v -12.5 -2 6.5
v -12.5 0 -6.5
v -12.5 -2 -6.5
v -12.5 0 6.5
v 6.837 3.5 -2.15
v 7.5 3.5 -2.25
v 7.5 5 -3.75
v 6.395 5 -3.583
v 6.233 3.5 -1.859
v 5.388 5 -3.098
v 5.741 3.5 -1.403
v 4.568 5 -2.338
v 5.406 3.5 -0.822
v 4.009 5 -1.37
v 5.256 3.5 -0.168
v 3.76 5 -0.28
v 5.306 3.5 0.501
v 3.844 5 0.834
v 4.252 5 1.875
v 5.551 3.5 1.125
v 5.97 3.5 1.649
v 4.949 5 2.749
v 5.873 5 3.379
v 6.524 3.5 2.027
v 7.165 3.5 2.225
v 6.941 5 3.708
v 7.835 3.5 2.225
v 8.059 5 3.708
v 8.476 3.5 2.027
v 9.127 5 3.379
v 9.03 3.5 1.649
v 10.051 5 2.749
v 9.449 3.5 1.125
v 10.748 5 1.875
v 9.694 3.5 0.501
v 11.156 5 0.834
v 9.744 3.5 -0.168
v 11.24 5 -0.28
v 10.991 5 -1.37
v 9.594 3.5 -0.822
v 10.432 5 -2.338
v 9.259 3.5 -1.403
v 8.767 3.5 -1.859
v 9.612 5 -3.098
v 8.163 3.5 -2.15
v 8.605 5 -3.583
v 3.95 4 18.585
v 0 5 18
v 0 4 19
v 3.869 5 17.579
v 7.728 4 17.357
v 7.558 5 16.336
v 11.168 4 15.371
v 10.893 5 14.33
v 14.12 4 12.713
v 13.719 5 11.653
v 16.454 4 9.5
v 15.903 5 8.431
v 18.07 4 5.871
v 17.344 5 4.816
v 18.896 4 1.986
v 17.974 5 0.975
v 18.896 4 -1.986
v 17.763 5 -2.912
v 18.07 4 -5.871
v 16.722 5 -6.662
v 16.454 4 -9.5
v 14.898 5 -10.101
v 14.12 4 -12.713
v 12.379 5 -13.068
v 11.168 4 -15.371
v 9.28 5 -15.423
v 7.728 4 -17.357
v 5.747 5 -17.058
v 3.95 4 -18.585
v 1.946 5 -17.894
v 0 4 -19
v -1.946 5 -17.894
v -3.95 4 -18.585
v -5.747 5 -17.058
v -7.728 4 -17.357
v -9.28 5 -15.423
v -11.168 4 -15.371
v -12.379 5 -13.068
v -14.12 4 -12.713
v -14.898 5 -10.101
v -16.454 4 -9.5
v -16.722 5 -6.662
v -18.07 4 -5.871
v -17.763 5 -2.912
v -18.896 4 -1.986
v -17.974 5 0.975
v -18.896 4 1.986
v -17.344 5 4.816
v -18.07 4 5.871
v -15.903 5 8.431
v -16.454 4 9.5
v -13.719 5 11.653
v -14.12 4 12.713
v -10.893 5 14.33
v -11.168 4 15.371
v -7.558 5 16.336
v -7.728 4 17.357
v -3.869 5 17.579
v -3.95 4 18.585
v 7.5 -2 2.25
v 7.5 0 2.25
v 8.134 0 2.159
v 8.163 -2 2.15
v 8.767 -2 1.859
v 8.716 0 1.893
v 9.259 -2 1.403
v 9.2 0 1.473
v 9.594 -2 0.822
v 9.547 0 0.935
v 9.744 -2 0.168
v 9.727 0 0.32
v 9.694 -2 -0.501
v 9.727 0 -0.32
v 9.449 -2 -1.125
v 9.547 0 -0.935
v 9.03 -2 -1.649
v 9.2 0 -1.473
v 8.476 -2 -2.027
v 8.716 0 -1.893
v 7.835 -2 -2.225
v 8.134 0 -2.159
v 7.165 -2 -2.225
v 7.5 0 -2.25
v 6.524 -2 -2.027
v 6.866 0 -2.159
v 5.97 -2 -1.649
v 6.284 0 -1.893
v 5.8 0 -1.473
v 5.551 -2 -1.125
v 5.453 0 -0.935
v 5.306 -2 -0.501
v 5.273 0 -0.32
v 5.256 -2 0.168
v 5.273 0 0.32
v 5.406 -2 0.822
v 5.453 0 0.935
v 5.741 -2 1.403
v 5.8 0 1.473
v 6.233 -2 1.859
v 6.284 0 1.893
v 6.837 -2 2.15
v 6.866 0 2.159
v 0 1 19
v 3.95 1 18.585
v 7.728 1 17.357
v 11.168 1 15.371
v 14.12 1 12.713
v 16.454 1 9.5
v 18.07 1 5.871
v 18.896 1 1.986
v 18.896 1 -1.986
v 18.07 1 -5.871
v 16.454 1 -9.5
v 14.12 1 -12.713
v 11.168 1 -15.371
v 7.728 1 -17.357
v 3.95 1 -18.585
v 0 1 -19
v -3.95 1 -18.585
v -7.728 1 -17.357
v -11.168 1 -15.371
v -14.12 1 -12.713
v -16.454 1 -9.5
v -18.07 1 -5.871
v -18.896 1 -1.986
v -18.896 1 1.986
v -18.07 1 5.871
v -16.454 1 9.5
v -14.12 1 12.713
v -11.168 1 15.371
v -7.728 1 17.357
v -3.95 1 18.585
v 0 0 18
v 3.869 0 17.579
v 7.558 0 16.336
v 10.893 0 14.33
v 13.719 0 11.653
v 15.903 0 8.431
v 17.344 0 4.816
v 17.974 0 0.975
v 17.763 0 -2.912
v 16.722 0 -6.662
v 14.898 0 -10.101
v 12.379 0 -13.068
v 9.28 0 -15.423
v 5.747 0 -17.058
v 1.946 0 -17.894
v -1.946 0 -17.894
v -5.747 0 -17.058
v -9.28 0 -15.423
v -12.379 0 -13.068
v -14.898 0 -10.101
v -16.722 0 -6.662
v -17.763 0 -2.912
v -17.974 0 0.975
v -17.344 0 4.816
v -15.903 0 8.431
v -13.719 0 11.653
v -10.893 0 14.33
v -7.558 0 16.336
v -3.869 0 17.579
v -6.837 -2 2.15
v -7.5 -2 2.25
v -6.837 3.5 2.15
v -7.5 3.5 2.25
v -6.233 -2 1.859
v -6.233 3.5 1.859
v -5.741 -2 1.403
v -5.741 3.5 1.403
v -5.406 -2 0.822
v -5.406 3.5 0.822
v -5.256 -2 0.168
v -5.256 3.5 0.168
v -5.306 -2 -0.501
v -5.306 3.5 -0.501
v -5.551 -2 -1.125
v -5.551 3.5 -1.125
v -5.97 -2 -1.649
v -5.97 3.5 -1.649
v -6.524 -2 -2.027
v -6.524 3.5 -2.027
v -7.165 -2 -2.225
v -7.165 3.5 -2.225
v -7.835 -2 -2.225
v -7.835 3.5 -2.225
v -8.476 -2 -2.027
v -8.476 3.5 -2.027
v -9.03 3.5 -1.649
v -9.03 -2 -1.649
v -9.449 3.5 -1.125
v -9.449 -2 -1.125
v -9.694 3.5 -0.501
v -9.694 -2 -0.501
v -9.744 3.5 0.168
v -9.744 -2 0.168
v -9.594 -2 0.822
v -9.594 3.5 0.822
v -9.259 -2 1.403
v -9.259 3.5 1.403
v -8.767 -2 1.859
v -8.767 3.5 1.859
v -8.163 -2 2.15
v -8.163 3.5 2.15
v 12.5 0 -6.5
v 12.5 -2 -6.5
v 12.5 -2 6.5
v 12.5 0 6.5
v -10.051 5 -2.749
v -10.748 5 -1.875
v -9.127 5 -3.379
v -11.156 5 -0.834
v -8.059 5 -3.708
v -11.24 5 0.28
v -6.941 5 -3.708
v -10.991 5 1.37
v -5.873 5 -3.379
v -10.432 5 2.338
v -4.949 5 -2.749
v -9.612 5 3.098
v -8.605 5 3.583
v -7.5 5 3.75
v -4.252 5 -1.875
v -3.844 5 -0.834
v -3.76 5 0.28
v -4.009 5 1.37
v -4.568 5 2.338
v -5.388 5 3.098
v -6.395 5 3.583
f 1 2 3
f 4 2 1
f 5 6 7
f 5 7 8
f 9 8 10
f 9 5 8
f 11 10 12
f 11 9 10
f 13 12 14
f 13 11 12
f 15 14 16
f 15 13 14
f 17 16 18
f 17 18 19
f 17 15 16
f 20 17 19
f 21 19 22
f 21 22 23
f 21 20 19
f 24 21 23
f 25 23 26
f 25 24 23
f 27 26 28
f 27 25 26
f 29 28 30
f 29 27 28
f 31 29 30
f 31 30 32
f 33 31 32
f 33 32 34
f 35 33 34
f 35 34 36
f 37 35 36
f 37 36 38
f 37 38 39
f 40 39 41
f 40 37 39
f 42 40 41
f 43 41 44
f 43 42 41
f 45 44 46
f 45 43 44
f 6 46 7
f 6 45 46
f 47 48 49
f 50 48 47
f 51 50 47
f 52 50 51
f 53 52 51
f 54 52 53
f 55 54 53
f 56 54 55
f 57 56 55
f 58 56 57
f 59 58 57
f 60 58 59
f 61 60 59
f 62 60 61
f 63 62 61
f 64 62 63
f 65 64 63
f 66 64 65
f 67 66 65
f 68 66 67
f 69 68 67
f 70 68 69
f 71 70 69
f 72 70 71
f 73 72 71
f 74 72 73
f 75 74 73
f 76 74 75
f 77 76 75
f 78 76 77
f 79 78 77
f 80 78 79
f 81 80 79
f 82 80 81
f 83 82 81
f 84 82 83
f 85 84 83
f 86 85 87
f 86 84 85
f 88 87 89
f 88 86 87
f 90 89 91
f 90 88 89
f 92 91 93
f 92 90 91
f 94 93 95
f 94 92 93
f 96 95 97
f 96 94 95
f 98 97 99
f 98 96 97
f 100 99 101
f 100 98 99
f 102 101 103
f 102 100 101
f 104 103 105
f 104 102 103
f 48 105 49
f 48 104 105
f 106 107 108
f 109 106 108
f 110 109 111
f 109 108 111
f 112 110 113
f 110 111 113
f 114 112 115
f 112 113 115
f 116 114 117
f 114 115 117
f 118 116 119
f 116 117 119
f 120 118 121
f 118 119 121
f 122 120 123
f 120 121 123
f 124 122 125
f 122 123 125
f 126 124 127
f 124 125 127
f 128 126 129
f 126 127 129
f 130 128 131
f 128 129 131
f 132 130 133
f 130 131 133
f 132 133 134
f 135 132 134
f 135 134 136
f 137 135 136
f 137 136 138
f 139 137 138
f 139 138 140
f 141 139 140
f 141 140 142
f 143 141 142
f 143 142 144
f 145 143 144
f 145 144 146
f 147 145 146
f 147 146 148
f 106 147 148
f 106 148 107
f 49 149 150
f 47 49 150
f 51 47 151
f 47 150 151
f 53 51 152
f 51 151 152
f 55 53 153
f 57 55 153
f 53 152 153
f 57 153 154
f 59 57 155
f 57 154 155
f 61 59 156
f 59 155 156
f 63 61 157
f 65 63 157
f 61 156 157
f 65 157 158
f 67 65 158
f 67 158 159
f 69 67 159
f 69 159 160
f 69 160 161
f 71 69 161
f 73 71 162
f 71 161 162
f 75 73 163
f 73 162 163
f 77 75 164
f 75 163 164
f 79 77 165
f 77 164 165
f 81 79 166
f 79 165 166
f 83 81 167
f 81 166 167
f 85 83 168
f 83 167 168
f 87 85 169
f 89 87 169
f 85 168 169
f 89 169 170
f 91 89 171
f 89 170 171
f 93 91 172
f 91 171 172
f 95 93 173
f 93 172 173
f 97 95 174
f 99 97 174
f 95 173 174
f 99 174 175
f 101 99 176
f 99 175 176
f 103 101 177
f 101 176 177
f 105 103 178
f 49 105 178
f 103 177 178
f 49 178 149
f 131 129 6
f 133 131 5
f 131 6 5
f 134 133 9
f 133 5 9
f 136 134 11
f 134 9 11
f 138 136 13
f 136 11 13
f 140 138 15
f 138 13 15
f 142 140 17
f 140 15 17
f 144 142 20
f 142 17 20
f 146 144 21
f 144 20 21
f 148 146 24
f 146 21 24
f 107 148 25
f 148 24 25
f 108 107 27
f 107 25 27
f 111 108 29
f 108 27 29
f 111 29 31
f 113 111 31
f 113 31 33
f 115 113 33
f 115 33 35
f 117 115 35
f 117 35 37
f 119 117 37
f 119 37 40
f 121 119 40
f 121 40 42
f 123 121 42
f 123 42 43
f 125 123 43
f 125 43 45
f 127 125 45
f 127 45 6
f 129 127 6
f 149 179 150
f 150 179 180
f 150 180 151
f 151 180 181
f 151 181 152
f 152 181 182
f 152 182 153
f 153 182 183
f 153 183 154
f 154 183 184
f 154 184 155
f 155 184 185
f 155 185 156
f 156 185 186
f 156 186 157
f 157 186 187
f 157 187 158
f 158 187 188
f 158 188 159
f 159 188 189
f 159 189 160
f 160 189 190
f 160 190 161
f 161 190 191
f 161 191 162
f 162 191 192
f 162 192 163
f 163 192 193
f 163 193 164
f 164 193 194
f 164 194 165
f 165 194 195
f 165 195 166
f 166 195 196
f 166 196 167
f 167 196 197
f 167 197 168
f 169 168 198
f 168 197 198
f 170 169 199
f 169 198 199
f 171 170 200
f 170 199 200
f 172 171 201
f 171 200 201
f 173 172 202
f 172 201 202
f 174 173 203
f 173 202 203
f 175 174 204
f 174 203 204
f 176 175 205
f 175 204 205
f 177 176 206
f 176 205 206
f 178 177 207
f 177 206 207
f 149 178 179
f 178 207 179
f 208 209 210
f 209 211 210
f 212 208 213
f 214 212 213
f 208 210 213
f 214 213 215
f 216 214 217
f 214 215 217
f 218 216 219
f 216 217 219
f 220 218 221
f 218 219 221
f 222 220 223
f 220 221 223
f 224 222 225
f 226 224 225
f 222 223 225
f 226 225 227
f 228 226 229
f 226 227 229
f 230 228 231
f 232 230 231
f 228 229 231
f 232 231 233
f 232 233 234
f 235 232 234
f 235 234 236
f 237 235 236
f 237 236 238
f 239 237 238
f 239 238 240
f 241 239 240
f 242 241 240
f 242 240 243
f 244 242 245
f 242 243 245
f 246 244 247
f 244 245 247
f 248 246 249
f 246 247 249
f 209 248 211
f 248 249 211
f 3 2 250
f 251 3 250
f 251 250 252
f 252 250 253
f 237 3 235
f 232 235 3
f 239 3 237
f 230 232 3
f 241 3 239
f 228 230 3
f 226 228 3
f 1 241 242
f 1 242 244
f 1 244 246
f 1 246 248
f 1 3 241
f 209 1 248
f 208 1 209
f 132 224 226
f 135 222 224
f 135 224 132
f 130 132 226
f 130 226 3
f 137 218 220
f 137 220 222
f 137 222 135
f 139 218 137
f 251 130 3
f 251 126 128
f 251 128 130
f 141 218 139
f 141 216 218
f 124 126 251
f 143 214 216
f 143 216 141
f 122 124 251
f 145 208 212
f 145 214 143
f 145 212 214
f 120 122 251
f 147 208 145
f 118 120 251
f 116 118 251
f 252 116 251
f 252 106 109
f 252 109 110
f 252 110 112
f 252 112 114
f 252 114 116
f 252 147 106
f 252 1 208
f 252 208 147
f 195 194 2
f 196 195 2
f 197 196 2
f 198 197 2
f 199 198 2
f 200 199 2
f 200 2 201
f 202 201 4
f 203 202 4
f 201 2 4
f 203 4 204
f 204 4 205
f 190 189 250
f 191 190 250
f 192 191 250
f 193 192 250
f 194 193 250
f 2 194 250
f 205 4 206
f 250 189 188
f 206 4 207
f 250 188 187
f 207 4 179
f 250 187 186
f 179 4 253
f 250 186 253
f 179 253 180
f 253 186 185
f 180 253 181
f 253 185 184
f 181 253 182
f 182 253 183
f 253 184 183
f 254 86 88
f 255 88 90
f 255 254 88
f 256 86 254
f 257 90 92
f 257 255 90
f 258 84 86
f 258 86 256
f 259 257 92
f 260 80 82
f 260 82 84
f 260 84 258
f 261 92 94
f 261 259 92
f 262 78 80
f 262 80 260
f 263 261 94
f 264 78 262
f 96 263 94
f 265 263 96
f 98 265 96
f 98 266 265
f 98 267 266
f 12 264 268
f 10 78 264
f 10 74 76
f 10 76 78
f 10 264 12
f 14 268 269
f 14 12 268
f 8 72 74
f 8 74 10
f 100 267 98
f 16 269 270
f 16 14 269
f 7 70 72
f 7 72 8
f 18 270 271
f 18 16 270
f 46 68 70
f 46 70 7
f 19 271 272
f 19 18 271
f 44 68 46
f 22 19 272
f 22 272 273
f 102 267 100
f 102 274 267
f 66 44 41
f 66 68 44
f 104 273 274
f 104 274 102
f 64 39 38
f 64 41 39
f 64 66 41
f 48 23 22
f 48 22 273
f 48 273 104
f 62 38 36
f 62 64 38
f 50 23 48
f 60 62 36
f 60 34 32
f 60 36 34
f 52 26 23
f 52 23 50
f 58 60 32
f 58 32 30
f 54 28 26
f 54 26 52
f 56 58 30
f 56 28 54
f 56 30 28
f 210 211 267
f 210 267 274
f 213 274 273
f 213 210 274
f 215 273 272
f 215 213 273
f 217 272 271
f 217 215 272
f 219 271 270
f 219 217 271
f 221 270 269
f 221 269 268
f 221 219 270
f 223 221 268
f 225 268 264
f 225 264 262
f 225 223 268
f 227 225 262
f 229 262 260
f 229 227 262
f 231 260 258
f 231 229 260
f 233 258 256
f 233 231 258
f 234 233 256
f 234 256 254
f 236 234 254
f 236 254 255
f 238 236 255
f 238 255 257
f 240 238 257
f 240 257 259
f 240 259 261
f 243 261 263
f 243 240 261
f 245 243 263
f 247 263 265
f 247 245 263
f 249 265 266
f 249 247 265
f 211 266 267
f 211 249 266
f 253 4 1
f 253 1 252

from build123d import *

# Parameters (mm, degrees)
SKETCH1_R           = 19
BOSS_EXTRUDE1_DEPTH = 5
CHAMFER2_SIZE       = 1
SKETCH2_R           = 2.25
CUT_EXTRUDE1_DEPTH  = 28.331300737
CHAMFER1_SIZE       = 1.5
SKETCH3_W           = 25
SKETCH3_H           = 13
BOSS_EXTRUDE2_DEPTH = 2
SKETCH4_R           = 2.25
CUT_EXTRUDE2_DEPTH  = 28.331300737


with BuildPart() as part:
    # Sketch1 → Boss-Extrude1 (new body)
    with BuildSketch(Plane(origin=(0, 0, 0), x_dir=(1, 0, 0), z_dir=(0, 1, 0))):
        with Locations(Location((0, 0, 0), (0, 0, 270))):
            Circle(SKETCH1_R)
    extrude(amount=BOSS_EXTRUDE1_DEPTH)

    # Chamfer2
    chamfer2_edges = [part.edges().sort_by_distance(p)[0] for p in [
        (0, 0, -19),
        (0, 5, -19),
    ]]
    chamfer(chamfer2_edges, length=CHAMFER2_SIZE)

    # Sketch2 → Cut-Extrude1 (cut, through all)
    with BuildSketch(Plane(origin=(0, 5, 0), x_dir=(1, 0, 0), z_dir=(0, 1, 0))):
        with Locations(Location((-7.5, 0, 0), (0, 0, 270))):
            Circle(SKETCH2_R)
        with Locations(Location((7.5, 0, 0), (0, 0, 90))):
            Circle(SKETCH2_R)
    extrude(amount=-CUT_EXTRUDE1_DEPTH, mode=Mode.SUBTRACT)

    # Chamfer1
    chamfer1_edges = [part.edges().sort_by_distance(p)[0] for p in [
        (-7.5, 5, -2.25),
        (7.5, 5, 2.25),
    ]]
    chamfer(chamfer1_edges, length=CHAMFER1_SIZE)

    # Sketch3 → Boss-Extrude2 (add)
    with BuildSketch(Plane.XZ):
        Rectangle(SKETCH3_W, SKETCH3_H)
    extrude(amount=BOSS_EXTRUDE2_DEPTH)

    # Sketch4 → Cut-Extrude2 (cut, through all)
    with BuildSketch(Plane(origin=(0, 0, 0), x_dir=(1, 0, 0), z_dir=(0, 1, 0))):
        with Locations(Location((7.5, 0, 0), (0, 0, 270))):
            Circle(SKETCH4_R)
        with Locations(Location((-7.5, 0, 0), (0, 0, 270))):
            Circle(SKETCH4_R)
    extrude(amount=-CUT_EXTRUDE2_DEPTH, mode=Mode.SUBTRACT)


solid = part.part
